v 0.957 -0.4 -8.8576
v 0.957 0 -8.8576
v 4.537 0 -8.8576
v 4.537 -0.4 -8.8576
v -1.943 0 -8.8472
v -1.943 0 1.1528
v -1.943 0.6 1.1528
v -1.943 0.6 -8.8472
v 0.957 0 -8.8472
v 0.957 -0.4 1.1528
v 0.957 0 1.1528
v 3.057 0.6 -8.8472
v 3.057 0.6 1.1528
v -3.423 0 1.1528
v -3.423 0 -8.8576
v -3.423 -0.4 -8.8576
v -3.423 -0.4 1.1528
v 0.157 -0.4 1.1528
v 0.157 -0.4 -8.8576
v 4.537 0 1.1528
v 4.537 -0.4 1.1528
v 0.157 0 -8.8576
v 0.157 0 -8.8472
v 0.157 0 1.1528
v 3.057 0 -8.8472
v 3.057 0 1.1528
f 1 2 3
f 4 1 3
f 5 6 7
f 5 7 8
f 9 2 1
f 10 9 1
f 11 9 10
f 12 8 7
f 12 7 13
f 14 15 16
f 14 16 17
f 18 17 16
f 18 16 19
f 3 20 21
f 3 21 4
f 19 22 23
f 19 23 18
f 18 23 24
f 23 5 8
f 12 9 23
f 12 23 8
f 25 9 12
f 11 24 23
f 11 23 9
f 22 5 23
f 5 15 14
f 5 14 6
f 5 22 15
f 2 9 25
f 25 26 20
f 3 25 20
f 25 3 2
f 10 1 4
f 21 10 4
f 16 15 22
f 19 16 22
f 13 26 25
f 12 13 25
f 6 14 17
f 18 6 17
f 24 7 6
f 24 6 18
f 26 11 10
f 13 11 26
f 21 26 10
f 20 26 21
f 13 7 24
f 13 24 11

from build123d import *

# Parameters (mm, degrees)
SKETCH1_W           = 5
SKETCH1_H           = 10
BOSS_EXTRUDE1_DEPTH = 0.6
SKETCH2_W           = 3.6
SKETCH2_H           = 10.01049857
BOSS_EXTRUDE2_DEPTH = 0.4
SKETCH4_W           = 10.01049857
SKETCH4_H           = 0.4
CUT_EXTRUDE2_DEPTH  = 0.02
SKETCH5_W           = 10.01049857
SKETCH5_H           = 0.4
CUT_EXTRUDE3_DEPTH  = 0.02


with BuildPart() as part:
    # Sketch1 → Boss-Extrude1 (new body)
    with BuildSketch(Plane(origin=(0, 0, 0), x_dir=(1, 0, 0), z_dir=(0, 1, 0))):
        with Locations((0.556994819, 3.847150259)):
            Rectangle(SKETCH1_W, SKETCH1_H)
    extrude(amount=BOSS_EXTRUDE1_DEPTH)

    # Sketch2 → Boss-Extrude2 (add)
    with BuildSketch(Plane.XZ):
        with Locations((2.756994819, -3.852399544)):
            Rectangle(SKETCH2_W, SKETCH2_H)
        with Locations((-1.643005181, -3.852399544)):
            Rectangle(SKETCH2_W, SKETCH2_H)
    extrude(amount=BOSS_EXTRUDE2_DEPTH)

    # Sketch4 → Cut-Extrude2 (cut)
    with BuildSketch(Plane(origin=(4.556994819, 0, 0), x_dir=(0, 0, -1), z_dir=(1, 0, 0))):
        with Locations((3.852399544, -0.2)):
            Rectangle(SKETCH4_W, SKETCH4_H)
    extrude(amount=-CUT_EXTRUDE2_DEPTH, mode=Mode.SUBTRACT)

    # Sketch5 → Cut-Extrude3 (cut)
    with BuildSketch(Plane.ZY.offset(3.443005181)):
        with Locations((-3.852399544, -0.2)):
            Rectangle(SKETCH5_W, SKETCH5_H)
    extrude(amount=-CUT_EXTRUDE3_DEPTH, mode=Mode.SUBTRACT)


solid = part.part
